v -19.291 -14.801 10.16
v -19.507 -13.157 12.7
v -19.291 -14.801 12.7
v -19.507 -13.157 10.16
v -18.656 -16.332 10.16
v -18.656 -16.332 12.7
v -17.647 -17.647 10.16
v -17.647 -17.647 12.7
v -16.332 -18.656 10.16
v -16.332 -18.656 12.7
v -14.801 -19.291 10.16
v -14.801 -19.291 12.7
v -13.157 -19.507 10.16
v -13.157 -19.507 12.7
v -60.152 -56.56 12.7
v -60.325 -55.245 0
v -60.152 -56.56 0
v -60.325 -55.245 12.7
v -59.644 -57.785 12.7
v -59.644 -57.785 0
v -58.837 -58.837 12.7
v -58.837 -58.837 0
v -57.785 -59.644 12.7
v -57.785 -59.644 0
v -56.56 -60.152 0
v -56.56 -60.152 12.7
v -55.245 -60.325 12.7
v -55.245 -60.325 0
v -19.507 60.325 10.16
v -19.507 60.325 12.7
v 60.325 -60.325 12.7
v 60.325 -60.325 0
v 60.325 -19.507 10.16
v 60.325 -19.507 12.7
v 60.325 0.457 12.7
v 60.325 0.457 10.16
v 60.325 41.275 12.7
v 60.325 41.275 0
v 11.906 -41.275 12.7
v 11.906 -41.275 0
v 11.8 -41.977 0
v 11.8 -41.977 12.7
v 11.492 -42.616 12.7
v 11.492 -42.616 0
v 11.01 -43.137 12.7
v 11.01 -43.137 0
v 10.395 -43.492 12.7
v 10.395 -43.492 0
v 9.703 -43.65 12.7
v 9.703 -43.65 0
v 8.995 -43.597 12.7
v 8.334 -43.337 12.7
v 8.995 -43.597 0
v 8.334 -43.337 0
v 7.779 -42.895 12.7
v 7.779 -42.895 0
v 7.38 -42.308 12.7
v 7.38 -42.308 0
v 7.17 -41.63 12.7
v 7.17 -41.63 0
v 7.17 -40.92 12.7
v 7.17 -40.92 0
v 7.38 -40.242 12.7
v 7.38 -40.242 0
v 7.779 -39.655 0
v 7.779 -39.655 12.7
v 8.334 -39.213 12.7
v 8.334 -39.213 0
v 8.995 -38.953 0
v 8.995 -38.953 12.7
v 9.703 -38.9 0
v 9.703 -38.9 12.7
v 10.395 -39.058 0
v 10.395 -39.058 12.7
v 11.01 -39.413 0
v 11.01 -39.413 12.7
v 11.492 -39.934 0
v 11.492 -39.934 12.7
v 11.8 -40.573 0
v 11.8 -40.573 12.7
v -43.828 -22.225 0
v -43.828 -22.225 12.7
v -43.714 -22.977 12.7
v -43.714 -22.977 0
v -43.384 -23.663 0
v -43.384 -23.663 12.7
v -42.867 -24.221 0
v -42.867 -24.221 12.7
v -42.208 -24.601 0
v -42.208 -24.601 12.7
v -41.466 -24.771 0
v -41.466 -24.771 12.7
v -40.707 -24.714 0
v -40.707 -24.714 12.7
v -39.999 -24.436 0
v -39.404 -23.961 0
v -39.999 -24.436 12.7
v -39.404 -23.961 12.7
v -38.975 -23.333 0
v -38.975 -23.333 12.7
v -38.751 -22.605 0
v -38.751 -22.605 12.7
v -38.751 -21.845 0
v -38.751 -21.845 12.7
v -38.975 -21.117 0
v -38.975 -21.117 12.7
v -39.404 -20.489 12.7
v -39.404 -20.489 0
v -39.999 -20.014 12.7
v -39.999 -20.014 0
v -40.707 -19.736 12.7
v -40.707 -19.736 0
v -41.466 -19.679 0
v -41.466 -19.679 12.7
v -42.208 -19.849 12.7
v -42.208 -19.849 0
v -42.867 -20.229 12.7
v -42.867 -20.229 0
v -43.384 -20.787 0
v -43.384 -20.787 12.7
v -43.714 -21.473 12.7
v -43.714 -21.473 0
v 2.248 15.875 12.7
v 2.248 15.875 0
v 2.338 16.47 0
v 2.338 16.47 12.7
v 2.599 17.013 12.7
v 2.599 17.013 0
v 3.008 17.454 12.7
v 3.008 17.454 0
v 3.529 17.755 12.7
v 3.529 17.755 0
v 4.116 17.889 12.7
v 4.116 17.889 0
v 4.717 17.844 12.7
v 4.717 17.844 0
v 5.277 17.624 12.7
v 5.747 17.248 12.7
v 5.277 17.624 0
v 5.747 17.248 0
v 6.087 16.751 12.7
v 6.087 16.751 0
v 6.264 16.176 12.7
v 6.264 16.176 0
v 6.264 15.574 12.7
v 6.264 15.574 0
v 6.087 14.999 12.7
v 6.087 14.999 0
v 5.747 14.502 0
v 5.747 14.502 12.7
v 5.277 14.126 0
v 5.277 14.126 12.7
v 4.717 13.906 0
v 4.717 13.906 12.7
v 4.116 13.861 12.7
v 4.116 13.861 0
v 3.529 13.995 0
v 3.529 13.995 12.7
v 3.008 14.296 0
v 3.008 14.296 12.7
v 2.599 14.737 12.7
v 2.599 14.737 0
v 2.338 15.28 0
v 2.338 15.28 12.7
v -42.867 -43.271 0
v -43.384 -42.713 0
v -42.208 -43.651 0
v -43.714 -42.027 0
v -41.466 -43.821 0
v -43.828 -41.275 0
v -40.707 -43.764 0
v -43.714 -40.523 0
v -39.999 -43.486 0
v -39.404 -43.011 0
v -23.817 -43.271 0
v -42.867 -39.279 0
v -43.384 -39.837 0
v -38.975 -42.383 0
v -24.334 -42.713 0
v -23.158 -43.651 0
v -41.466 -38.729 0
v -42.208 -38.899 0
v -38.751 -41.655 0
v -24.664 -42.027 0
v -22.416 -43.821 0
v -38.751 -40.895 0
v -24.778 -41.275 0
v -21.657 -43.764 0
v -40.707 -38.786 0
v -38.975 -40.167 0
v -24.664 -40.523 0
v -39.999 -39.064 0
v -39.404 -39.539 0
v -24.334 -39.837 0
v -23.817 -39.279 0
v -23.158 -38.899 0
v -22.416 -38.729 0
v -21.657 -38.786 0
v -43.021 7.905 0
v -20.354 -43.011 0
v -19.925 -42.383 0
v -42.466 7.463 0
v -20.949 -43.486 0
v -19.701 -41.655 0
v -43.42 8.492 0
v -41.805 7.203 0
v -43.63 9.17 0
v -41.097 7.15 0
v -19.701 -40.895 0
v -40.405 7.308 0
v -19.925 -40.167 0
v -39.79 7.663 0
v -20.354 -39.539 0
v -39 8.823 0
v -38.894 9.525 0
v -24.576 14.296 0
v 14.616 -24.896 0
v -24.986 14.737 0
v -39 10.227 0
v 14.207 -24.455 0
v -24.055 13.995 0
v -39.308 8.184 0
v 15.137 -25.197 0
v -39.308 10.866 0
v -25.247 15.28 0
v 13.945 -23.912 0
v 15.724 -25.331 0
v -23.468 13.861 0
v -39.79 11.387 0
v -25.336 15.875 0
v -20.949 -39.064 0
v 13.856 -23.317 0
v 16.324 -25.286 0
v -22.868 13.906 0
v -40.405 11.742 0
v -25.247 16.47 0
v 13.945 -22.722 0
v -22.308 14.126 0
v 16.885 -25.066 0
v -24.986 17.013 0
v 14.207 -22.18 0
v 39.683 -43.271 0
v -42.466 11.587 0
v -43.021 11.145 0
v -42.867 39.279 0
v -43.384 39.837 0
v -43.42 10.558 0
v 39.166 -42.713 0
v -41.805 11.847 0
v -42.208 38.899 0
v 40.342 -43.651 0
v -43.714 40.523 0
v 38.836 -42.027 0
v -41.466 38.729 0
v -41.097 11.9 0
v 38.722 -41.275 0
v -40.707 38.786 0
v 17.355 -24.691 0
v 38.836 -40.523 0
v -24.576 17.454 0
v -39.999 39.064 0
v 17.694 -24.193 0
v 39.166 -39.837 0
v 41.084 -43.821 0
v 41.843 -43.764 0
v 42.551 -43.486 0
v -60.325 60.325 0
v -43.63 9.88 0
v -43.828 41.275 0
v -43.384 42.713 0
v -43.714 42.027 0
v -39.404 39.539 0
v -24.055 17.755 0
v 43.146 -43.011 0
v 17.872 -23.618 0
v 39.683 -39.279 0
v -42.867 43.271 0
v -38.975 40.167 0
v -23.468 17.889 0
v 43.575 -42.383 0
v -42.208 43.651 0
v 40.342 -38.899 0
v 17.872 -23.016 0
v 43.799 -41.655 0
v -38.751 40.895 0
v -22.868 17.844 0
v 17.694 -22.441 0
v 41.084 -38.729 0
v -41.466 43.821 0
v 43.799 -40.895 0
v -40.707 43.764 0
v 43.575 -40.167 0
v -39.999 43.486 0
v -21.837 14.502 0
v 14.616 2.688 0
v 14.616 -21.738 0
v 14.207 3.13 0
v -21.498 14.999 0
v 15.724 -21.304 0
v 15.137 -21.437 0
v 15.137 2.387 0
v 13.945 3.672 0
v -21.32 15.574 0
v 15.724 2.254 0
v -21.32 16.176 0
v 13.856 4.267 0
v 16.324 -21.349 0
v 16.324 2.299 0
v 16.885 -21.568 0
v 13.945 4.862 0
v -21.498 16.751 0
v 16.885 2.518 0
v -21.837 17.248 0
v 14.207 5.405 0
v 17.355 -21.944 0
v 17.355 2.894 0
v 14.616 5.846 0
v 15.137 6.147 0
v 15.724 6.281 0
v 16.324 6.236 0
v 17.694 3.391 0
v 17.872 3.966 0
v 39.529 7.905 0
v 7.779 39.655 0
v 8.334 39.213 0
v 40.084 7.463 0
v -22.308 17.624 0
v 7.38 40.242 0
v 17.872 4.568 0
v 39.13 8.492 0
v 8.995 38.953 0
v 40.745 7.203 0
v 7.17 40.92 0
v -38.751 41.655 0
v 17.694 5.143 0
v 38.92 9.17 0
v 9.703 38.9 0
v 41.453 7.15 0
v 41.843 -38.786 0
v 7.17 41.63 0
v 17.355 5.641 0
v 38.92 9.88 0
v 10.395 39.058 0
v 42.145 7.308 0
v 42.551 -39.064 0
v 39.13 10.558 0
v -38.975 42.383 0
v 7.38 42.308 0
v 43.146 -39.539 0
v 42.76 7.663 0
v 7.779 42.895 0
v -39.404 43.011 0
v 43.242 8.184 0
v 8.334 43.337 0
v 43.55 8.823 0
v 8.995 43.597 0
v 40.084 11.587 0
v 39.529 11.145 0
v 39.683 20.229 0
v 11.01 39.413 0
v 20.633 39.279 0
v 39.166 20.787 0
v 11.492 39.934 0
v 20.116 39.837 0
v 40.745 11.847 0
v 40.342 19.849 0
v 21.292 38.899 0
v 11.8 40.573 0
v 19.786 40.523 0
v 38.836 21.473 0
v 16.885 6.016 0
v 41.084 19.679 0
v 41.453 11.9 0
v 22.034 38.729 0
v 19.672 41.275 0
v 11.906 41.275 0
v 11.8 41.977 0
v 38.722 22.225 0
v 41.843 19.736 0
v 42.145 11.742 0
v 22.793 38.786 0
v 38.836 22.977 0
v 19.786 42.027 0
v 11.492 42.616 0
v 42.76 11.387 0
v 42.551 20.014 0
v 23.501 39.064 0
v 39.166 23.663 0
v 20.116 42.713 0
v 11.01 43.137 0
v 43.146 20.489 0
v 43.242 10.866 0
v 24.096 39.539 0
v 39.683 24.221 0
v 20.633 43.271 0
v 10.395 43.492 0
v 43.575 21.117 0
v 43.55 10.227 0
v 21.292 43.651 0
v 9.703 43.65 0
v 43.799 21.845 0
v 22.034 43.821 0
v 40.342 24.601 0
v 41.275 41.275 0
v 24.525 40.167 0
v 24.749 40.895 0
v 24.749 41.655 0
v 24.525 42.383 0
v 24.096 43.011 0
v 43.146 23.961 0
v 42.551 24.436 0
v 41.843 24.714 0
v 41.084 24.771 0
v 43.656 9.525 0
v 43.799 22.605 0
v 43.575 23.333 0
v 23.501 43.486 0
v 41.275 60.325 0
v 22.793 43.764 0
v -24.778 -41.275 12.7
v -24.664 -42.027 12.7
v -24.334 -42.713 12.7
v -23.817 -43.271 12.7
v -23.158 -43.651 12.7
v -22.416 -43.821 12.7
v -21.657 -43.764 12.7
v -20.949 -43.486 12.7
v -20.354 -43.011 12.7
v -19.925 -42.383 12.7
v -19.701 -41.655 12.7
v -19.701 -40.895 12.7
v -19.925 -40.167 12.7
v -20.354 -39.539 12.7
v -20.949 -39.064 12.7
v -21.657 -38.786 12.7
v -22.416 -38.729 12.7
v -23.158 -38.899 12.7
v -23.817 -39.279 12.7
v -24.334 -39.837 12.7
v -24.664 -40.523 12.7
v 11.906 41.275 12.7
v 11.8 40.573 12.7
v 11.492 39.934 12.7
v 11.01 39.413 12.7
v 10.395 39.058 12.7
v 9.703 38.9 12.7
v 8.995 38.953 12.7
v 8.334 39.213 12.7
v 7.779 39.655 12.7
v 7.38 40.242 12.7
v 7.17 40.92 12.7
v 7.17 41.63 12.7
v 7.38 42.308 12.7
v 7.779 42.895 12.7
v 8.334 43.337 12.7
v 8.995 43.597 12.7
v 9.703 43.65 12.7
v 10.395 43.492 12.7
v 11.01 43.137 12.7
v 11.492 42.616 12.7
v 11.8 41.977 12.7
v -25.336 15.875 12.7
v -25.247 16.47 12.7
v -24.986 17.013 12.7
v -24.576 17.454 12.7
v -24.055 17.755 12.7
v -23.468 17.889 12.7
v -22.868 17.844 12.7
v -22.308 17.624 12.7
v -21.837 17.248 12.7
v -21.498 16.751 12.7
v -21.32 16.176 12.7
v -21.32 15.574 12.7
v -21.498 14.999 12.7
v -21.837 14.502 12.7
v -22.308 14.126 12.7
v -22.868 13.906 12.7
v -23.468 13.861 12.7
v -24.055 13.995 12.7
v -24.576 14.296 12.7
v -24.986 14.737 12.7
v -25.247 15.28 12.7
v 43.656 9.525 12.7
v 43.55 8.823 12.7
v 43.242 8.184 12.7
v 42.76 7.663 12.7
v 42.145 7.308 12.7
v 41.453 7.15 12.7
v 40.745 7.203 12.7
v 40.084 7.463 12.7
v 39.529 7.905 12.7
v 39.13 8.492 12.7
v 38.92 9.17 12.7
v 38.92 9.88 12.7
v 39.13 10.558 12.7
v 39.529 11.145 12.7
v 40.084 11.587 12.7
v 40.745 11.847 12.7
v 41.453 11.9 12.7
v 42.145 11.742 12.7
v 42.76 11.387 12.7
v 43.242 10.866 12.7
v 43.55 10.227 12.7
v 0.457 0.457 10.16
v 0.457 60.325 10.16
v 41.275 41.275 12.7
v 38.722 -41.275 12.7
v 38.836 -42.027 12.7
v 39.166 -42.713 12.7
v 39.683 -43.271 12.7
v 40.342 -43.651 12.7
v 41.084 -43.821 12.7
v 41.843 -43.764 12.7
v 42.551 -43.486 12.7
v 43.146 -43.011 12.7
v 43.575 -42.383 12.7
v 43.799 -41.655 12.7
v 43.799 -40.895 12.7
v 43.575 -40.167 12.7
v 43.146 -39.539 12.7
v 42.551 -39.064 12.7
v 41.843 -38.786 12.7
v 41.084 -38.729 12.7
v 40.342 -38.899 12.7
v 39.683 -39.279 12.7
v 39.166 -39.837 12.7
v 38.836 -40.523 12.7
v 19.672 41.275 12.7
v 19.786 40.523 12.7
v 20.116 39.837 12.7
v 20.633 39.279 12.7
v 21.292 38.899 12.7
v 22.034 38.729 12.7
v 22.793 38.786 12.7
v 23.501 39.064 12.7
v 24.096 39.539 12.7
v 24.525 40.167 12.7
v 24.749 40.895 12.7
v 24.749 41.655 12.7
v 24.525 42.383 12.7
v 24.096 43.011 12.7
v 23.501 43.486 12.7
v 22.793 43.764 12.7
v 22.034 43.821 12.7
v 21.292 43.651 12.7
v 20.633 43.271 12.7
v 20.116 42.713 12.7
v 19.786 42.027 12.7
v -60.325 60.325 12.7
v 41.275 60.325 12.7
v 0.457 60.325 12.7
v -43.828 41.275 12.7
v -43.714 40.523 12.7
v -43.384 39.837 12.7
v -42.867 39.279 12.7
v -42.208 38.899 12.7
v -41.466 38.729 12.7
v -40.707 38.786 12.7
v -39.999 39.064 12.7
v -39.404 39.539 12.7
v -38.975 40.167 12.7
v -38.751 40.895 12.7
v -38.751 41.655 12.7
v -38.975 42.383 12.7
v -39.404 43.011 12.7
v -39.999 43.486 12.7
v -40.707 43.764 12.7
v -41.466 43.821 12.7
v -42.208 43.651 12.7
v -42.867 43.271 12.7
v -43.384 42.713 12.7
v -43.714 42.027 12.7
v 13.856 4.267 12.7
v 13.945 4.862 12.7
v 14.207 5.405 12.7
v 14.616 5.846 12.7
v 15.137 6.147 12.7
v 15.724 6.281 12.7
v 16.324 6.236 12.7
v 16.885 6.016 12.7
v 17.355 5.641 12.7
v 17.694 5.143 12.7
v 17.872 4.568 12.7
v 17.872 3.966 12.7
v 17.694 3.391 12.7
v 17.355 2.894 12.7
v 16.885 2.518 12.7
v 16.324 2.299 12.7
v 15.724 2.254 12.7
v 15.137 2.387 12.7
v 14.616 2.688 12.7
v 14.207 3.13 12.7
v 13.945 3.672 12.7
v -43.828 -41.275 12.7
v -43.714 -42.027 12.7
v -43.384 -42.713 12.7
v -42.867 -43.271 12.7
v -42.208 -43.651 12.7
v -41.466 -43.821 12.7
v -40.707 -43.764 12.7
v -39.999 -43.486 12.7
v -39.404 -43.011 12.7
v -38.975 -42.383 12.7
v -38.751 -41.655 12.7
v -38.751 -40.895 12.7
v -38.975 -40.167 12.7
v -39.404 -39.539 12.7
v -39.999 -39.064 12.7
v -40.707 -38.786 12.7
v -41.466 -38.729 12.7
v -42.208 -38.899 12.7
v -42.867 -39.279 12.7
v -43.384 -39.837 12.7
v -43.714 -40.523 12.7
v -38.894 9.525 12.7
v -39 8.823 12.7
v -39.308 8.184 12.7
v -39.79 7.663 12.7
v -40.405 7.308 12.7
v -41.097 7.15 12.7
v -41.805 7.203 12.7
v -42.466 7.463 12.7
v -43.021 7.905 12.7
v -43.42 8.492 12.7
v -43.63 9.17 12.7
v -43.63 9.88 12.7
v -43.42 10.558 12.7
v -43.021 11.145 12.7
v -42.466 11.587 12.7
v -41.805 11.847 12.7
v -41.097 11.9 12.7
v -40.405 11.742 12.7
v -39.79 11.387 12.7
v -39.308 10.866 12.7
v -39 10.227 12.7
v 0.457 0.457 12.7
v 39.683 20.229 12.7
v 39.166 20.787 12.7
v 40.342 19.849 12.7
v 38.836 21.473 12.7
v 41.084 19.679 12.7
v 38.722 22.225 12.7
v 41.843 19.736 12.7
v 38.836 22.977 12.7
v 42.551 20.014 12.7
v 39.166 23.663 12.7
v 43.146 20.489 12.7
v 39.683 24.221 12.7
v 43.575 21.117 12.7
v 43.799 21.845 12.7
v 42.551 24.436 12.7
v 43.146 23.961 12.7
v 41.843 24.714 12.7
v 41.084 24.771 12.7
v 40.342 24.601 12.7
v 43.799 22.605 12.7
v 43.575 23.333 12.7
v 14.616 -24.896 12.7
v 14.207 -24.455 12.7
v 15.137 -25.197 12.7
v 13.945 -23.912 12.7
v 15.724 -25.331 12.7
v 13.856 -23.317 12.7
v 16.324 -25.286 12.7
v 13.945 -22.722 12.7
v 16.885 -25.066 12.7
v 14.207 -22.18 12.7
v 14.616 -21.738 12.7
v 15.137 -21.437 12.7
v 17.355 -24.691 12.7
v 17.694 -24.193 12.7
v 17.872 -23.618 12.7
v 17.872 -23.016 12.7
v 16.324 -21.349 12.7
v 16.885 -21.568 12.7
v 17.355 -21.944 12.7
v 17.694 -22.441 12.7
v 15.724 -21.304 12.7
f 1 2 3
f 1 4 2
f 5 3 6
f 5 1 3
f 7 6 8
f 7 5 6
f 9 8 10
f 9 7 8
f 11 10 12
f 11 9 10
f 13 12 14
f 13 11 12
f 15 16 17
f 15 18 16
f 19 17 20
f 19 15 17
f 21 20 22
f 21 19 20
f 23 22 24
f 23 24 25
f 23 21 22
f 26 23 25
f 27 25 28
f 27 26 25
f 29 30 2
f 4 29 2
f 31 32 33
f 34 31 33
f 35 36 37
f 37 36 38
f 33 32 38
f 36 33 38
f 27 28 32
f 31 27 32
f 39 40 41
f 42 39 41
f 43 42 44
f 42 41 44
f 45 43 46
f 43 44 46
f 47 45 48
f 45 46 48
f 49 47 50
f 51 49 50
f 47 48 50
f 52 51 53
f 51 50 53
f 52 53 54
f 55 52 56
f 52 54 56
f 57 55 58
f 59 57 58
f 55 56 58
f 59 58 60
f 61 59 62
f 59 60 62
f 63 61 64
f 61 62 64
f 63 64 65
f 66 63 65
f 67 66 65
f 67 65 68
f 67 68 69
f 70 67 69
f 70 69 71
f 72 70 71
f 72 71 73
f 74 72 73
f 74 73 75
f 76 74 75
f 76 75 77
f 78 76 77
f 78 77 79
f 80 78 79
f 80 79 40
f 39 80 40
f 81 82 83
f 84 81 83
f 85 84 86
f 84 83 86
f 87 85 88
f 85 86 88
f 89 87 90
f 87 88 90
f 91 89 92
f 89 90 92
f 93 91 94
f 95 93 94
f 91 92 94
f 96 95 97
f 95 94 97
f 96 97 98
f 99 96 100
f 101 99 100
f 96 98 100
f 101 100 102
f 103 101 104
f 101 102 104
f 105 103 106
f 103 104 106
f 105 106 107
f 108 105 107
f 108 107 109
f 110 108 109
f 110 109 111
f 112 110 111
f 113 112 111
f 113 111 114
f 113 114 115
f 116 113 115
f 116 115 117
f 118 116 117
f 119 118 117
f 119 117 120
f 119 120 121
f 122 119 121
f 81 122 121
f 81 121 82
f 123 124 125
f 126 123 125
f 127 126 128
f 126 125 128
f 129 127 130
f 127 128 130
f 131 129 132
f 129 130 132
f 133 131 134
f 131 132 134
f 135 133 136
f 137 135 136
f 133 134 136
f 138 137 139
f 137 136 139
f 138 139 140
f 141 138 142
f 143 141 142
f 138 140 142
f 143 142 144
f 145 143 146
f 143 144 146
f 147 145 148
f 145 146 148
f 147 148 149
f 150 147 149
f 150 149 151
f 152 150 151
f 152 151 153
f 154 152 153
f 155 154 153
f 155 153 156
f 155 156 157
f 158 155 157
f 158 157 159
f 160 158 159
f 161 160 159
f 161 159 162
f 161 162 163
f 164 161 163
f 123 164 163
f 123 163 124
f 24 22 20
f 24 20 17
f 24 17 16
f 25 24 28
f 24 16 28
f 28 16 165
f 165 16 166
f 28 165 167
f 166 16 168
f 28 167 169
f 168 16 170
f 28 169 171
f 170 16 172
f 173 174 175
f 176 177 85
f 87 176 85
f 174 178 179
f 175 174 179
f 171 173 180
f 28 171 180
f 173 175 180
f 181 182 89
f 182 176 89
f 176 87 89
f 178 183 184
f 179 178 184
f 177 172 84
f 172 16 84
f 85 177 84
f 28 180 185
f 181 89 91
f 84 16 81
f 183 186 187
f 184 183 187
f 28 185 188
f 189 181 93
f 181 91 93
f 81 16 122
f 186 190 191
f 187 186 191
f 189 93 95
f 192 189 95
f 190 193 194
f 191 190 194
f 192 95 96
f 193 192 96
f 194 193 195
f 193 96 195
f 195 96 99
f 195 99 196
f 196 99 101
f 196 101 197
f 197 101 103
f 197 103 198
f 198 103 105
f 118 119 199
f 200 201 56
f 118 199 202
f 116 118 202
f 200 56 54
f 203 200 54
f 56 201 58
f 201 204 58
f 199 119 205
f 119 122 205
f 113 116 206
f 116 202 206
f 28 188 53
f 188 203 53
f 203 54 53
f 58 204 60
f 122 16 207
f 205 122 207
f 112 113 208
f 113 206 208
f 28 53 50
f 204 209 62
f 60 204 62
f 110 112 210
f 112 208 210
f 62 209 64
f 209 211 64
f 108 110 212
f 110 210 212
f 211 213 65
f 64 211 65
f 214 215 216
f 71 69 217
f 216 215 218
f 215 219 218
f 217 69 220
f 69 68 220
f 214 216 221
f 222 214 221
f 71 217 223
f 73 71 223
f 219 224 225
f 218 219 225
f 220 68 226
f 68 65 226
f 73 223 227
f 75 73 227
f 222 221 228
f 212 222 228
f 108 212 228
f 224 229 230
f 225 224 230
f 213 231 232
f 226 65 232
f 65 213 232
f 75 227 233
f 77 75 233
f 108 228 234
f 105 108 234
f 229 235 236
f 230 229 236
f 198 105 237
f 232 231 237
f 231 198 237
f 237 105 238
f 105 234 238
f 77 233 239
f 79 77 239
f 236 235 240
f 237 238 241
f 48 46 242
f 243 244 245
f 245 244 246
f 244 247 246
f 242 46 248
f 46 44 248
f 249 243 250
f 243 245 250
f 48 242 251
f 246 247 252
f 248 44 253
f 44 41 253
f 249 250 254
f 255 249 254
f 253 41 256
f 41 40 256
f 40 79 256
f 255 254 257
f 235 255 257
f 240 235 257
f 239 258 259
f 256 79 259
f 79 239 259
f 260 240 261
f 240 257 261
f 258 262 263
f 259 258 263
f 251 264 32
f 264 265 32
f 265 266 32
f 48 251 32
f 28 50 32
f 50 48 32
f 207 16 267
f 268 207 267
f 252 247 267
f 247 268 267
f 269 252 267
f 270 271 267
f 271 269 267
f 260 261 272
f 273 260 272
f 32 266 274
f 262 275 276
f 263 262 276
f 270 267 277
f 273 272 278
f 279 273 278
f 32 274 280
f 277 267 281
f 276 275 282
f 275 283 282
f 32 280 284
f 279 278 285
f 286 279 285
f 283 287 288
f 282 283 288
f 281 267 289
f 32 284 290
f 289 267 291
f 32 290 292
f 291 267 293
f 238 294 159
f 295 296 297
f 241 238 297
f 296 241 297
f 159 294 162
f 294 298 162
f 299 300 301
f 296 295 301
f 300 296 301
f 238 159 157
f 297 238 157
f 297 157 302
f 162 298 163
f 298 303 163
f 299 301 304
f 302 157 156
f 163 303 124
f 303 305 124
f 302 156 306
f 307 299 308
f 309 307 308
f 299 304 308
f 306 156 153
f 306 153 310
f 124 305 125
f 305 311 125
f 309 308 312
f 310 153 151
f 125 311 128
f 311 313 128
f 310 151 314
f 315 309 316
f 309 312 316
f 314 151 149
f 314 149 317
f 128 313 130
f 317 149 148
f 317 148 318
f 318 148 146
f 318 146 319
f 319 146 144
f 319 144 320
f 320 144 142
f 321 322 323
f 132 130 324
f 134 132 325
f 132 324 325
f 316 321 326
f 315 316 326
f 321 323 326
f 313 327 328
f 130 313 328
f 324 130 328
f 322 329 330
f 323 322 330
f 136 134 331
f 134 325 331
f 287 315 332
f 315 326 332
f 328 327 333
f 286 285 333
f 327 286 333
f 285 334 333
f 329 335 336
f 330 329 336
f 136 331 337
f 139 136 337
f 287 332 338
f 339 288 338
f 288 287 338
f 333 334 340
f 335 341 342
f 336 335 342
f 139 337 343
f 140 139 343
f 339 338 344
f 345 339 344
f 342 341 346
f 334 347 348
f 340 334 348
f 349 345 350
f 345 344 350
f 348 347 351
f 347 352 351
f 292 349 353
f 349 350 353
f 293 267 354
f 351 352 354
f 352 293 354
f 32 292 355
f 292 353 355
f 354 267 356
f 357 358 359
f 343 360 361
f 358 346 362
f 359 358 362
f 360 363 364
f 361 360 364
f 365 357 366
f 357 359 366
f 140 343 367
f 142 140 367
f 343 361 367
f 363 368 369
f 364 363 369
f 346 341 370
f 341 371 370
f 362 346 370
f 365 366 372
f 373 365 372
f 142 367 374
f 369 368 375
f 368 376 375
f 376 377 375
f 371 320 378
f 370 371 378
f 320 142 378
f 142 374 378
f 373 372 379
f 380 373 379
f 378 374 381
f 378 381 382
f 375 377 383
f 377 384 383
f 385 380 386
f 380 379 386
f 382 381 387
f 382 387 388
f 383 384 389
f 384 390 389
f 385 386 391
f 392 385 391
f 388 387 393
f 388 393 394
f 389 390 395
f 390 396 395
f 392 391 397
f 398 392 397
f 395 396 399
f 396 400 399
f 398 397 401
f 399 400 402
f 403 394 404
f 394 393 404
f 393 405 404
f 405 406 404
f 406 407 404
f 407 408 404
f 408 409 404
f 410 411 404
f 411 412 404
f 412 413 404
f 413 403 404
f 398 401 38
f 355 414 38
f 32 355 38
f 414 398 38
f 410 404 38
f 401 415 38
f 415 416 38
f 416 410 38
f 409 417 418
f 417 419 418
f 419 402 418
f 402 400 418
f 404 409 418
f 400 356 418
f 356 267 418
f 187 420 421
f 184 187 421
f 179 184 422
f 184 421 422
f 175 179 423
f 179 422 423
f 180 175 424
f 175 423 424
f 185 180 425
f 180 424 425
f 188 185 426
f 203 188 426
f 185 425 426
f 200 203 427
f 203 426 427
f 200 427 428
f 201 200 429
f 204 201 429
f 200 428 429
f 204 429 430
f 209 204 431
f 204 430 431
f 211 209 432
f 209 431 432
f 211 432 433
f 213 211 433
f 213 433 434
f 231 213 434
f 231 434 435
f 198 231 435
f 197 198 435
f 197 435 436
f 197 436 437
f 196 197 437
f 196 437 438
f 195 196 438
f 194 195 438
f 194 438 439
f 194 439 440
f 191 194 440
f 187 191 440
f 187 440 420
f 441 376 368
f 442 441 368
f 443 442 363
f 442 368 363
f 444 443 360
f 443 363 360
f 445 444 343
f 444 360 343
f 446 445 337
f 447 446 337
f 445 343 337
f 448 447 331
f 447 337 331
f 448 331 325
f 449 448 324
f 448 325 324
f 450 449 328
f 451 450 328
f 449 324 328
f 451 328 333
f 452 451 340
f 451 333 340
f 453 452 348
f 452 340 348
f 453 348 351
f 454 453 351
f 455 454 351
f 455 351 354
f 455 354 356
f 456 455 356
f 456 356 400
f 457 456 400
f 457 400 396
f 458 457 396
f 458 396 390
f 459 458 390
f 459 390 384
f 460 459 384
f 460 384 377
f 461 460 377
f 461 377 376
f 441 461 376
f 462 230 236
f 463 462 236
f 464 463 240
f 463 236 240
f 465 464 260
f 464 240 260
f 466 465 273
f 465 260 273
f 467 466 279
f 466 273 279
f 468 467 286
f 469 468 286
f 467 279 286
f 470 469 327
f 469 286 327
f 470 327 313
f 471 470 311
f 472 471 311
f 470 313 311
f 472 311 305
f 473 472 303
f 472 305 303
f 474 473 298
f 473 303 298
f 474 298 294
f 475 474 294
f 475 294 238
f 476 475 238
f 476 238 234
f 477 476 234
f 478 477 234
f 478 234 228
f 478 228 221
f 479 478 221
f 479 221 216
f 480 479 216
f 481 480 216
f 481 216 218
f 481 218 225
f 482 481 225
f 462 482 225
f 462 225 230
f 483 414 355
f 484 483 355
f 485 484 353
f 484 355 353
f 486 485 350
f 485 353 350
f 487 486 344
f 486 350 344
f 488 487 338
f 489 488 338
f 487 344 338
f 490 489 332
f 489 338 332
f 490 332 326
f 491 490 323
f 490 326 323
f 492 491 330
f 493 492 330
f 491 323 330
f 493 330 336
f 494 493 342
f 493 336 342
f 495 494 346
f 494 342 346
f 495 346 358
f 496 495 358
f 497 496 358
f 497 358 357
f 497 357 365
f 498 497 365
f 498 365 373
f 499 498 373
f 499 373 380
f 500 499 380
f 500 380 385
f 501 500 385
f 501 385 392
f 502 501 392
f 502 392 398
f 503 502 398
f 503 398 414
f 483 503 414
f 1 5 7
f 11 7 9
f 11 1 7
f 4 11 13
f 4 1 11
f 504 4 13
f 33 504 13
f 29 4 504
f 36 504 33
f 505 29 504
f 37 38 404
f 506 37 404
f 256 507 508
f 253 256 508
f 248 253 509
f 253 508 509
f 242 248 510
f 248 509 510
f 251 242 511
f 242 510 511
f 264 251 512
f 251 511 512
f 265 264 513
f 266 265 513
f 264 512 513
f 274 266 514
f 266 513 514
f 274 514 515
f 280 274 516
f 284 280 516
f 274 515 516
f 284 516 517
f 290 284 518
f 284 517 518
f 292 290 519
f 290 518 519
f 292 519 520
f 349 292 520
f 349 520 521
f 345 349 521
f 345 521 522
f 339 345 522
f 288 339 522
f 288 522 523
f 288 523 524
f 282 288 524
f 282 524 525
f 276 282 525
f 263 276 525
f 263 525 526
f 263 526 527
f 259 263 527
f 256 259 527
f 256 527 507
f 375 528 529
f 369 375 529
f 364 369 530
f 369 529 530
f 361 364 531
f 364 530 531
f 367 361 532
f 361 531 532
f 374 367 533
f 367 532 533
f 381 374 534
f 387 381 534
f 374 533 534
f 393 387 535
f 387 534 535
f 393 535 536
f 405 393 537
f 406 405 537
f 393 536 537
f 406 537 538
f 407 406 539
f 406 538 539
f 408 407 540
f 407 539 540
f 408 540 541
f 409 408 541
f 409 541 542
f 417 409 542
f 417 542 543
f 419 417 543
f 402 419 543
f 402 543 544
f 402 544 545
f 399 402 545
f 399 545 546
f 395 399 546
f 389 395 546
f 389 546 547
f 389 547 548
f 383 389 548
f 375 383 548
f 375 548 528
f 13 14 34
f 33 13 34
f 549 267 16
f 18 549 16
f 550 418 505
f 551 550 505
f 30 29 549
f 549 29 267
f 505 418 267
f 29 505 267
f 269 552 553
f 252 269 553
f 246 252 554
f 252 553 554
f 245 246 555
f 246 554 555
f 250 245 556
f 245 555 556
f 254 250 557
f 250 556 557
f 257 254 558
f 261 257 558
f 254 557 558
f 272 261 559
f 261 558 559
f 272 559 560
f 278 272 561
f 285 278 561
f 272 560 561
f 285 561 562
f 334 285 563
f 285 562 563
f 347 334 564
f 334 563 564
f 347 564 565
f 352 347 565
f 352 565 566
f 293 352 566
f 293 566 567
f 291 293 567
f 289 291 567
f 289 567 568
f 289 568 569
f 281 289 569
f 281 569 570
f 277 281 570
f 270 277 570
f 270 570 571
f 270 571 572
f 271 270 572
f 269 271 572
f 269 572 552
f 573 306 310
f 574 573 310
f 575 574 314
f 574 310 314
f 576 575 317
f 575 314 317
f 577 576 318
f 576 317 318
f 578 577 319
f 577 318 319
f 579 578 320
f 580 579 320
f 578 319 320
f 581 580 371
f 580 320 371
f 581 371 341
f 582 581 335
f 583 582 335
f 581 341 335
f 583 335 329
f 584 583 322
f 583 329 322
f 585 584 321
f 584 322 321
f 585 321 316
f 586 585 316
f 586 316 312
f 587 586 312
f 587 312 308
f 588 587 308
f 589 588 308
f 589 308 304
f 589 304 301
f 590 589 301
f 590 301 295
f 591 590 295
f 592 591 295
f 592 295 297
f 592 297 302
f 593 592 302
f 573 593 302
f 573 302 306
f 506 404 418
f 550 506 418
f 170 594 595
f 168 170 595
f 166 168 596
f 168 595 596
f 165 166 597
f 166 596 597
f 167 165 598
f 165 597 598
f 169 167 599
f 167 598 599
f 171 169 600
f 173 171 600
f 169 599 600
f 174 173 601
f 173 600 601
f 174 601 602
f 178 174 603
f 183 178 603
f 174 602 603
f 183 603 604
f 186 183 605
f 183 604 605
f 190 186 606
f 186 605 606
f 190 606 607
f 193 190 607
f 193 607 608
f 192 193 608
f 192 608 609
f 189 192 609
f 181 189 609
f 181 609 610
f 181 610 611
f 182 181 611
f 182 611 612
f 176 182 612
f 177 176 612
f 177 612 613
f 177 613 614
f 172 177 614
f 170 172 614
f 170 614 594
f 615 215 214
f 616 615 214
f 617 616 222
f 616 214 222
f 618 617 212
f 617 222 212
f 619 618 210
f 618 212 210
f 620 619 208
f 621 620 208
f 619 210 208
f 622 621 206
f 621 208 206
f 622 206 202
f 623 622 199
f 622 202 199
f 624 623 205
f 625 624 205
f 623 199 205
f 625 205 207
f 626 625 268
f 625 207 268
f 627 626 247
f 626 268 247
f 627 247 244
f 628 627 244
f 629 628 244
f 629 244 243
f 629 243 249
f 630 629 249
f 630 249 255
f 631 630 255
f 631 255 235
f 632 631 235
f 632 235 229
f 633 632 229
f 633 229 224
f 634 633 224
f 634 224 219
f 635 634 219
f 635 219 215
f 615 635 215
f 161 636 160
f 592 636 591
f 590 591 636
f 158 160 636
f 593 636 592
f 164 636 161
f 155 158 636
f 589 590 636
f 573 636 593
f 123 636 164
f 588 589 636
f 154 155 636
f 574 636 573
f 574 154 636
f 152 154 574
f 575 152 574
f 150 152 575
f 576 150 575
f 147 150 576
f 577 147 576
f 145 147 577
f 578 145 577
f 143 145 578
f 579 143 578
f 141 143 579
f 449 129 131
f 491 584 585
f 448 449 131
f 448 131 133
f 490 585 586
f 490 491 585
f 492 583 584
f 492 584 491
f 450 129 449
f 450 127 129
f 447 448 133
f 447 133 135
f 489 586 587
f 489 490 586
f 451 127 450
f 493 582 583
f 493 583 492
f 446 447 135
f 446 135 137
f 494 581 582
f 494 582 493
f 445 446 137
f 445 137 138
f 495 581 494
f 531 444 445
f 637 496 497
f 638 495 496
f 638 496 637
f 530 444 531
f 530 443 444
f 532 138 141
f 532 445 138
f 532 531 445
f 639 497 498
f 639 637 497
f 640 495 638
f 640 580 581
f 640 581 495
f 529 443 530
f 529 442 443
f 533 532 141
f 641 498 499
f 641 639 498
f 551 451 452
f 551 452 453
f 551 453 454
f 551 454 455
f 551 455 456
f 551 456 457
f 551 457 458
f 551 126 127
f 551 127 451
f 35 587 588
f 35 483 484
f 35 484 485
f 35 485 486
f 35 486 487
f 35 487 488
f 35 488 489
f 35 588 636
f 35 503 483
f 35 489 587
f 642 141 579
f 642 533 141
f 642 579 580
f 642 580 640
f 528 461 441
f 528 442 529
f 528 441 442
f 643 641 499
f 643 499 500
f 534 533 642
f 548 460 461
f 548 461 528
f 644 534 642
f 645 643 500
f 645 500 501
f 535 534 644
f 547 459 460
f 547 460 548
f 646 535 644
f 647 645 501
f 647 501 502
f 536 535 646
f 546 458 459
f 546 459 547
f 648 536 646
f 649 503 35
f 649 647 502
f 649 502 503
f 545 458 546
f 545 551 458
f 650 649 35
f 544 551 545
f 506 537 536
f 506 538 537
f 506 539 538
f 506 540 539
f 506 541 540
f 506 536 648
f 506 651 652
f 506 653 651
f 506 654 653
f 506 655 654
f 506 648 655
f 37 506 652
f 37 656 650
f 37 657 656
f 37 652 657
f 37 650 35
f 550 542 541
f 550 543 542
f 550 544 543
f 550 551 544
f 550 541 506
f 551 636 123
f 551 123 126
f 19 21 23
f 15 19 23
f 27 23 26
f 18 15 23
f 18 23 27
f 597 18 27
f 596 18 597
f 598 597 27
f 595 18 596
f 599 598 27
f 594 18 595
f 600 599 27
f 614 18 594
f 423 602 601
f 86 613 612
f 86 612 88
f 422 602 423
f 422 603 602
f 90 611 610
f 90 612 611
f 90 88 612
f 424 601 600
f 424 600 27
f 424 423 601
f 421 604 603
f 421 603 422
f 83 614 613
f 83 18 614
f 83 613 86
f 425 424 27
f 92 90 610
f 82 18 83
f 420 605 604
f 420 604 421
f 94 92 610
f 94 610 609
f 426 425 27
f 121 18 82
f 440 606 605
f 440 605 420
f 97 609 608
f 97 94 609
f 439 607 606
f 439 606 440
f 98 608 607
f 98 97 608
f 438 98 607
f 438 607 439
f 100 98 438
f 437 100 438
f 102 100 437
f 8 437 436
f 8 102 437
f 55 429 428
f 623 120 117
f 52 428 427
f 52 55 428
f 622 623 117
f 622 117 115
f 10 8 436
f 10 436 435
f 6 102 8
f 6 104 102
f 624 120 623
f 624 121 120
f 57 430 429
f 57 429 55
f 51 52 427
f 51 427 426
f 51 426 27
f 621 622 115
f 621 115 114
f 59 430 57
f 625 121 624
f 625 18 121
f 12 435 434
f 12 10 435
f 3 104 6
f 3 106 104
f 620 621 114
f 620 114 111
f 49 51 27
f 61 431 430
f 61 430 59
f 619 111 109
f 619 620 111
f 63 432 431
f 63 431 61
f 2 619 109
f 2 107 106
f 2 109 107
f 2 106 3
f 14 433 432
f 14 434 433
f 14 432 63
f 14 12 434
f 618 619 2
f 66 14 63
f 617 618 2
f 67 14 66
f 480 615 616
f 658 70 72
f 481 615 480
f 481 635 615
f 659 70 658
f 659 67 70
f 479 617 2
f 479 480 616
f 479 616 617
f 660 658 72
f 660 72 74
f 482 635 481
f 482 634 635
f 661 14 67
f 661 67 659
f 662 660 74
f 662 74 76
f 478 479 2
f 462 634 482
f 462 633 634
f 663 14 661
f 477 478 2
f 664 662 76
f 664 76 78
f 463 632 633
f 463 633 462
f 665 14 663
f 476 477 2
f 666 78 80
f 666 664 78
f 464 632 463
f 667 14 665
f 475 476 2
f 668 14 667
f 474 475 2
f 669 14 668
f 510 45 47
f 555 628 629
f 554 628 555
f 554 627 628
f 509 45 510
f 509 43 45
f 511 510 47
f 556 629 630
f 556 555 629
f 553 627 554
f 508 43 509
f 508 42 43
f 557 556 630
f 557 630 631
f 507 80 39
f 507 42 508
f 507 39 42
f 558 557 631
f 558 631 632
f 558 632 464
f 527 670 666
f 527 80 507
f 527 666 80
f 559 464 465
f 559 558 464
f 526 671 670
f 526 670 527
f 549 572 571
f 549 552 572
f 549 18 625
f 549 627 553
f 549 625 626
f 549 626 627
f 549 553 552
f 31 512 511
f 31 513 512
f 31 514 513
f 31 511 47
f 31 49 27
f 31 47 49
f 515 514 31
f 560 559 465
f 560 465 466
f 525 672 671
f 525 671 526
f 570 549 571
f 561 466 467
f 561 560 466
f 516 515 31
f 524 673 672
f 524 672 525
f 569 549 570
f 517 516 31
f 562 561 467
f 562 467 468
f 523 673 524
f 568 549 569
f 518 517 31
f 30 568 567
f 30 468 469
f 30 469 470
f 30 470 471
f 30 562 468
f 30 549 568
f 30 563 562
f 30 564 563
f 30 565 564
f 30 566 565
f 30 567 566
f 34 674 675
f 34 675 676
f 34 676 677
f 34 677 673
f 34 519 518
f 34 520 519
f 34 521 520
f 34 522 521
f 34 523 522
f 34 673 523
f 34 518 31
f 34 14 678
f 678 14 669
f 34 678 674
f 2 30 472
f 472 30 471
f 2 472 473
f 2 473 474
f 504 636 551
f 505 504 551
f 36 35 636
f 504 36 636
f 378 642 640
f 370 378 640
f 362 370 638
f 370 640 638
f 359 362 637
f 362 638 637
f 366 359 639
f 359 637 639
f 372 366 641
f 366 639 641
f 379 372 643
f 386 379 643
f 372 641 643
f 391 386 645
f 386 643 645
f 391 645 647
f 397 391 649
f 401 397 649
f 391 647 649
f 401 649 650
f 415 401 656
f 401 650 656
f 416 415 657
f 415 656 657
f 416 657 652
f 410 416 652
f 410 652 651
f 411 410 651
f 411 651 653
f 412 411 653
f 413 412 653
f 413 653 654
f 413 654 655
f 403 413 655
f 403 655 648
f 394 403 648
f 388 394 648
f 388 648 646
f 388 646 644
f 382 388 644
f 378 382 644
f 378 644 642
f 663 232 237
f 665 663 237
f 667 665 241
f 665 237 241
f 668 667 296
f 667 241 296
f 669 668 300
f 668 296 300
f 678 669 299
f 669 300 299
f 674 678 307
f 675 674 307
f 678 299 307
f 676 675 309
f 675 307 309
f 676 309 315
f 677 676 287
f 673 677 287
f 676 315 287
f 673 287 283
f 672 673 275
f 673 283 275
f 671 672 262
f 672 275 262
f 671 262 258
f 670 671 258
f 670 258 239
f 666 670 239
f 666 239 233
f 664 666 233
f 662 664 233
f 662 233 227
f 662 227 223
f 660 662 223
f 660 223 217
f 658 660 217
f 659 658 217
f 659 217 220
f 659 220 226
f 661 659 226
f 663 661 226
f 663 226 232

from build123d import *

# Parameters (mm, degrees)
F1_DEPTH  = 12.7
F3_DEPTH  = 2.54
F5_D      = 5.1054
F7_D      = 4.0386
F9_D      = 5.1054
F10_R     = 2.38125
F11_DEPTH = 12.701
F12_R     = 6.35
F13_R     = 5.08


with BuildPart() as f1:
    # F0 (on Top) → F1 (new body)
    with BuildSketch(Plane.XY):
        Polygon((41.275, 41.275), (41.275, 60.325), (-60.325, 60.325), (-60.325, -60.325), (60.325, -60.325), (60.325, 41.275), align=None)
    extrude(amount=F1_DEPTH)

    # F2 (on face) → F3 (cut)
    with BuildSketch(Plane.XY.offset(12.7)):
        Polygon((0.4572, 60.325), (-19.5072, 60.325), (-19.5072, -19.5072), (60.325, -19.5072), (60.325, 0.4572), (0.4572, 0.4572), align=None)
    extrude(amount=-F3_DEPTH, mode=Mode.SUBTRACT)

    # F5 (through all)
    with Locations(Plane(origin=(0, 0, 0), x_dir=(1, 0, 0), z_dir=(0, 0, -1))):
        with Locations((-41.275, -41.275), (22.225, -41.275), (41.275, -22.225), (41.275, 41.275), (-22.225, 41.275), (-41.275, 22.225)):
            Hole(F5_D / 2)

    # F7 (through all)
    with Locations(Plane.XY.offset(12.7)):
        with Locations((4.2672, 15.875), (-23.3172, 15.875), (15.875, 4.2672), (15.875, -23.3172)):
            Hole(F7_D / 2)

    # F9 (through all)
    with Locations(Plane(origin=(0, 0, 0), x_dir=(1, 0, 0), z_dir=(0, 0, -1))):
        with Locations((-41.275, 41.275)):
            Hole(F9_D / 2)

    # F10 (on face) → F11 (cut, through all)
    with BuildSketch(Plane(origin=(0, 0, 0), x_dir=(1, 0, 0), z_dir=(0, 0, -1))):
        with Locations((9.525, 41.275)):
            Circle(F10_R)
        with Locations((41.275, -9.525)):
            Circle(F10_R)
        with Locations((9.525, -41.275)):
            Circle(F10_R)
        with Locations((-41.275, -9.525)):
            Circle(F10_R)
    extrude(amount=-F11_DEPTH, mode=Mode.SUBTRACT)

    # F12
    f12_edges = [f1.edges().sort_by_distance(p)[0] for p in [
        (-19.5072, -19.5072, 11.43),
    ]]
    fillet(f12_edges, radius=F12_R)

    # F13
    f13_edges = [f1.edges().sort_by_distance(p)[0] for p in [
        (-60.325, -60.325, 6.35),
    ]]
    fillet(f13_edges, radius=F13_R)


solid = f1.part
